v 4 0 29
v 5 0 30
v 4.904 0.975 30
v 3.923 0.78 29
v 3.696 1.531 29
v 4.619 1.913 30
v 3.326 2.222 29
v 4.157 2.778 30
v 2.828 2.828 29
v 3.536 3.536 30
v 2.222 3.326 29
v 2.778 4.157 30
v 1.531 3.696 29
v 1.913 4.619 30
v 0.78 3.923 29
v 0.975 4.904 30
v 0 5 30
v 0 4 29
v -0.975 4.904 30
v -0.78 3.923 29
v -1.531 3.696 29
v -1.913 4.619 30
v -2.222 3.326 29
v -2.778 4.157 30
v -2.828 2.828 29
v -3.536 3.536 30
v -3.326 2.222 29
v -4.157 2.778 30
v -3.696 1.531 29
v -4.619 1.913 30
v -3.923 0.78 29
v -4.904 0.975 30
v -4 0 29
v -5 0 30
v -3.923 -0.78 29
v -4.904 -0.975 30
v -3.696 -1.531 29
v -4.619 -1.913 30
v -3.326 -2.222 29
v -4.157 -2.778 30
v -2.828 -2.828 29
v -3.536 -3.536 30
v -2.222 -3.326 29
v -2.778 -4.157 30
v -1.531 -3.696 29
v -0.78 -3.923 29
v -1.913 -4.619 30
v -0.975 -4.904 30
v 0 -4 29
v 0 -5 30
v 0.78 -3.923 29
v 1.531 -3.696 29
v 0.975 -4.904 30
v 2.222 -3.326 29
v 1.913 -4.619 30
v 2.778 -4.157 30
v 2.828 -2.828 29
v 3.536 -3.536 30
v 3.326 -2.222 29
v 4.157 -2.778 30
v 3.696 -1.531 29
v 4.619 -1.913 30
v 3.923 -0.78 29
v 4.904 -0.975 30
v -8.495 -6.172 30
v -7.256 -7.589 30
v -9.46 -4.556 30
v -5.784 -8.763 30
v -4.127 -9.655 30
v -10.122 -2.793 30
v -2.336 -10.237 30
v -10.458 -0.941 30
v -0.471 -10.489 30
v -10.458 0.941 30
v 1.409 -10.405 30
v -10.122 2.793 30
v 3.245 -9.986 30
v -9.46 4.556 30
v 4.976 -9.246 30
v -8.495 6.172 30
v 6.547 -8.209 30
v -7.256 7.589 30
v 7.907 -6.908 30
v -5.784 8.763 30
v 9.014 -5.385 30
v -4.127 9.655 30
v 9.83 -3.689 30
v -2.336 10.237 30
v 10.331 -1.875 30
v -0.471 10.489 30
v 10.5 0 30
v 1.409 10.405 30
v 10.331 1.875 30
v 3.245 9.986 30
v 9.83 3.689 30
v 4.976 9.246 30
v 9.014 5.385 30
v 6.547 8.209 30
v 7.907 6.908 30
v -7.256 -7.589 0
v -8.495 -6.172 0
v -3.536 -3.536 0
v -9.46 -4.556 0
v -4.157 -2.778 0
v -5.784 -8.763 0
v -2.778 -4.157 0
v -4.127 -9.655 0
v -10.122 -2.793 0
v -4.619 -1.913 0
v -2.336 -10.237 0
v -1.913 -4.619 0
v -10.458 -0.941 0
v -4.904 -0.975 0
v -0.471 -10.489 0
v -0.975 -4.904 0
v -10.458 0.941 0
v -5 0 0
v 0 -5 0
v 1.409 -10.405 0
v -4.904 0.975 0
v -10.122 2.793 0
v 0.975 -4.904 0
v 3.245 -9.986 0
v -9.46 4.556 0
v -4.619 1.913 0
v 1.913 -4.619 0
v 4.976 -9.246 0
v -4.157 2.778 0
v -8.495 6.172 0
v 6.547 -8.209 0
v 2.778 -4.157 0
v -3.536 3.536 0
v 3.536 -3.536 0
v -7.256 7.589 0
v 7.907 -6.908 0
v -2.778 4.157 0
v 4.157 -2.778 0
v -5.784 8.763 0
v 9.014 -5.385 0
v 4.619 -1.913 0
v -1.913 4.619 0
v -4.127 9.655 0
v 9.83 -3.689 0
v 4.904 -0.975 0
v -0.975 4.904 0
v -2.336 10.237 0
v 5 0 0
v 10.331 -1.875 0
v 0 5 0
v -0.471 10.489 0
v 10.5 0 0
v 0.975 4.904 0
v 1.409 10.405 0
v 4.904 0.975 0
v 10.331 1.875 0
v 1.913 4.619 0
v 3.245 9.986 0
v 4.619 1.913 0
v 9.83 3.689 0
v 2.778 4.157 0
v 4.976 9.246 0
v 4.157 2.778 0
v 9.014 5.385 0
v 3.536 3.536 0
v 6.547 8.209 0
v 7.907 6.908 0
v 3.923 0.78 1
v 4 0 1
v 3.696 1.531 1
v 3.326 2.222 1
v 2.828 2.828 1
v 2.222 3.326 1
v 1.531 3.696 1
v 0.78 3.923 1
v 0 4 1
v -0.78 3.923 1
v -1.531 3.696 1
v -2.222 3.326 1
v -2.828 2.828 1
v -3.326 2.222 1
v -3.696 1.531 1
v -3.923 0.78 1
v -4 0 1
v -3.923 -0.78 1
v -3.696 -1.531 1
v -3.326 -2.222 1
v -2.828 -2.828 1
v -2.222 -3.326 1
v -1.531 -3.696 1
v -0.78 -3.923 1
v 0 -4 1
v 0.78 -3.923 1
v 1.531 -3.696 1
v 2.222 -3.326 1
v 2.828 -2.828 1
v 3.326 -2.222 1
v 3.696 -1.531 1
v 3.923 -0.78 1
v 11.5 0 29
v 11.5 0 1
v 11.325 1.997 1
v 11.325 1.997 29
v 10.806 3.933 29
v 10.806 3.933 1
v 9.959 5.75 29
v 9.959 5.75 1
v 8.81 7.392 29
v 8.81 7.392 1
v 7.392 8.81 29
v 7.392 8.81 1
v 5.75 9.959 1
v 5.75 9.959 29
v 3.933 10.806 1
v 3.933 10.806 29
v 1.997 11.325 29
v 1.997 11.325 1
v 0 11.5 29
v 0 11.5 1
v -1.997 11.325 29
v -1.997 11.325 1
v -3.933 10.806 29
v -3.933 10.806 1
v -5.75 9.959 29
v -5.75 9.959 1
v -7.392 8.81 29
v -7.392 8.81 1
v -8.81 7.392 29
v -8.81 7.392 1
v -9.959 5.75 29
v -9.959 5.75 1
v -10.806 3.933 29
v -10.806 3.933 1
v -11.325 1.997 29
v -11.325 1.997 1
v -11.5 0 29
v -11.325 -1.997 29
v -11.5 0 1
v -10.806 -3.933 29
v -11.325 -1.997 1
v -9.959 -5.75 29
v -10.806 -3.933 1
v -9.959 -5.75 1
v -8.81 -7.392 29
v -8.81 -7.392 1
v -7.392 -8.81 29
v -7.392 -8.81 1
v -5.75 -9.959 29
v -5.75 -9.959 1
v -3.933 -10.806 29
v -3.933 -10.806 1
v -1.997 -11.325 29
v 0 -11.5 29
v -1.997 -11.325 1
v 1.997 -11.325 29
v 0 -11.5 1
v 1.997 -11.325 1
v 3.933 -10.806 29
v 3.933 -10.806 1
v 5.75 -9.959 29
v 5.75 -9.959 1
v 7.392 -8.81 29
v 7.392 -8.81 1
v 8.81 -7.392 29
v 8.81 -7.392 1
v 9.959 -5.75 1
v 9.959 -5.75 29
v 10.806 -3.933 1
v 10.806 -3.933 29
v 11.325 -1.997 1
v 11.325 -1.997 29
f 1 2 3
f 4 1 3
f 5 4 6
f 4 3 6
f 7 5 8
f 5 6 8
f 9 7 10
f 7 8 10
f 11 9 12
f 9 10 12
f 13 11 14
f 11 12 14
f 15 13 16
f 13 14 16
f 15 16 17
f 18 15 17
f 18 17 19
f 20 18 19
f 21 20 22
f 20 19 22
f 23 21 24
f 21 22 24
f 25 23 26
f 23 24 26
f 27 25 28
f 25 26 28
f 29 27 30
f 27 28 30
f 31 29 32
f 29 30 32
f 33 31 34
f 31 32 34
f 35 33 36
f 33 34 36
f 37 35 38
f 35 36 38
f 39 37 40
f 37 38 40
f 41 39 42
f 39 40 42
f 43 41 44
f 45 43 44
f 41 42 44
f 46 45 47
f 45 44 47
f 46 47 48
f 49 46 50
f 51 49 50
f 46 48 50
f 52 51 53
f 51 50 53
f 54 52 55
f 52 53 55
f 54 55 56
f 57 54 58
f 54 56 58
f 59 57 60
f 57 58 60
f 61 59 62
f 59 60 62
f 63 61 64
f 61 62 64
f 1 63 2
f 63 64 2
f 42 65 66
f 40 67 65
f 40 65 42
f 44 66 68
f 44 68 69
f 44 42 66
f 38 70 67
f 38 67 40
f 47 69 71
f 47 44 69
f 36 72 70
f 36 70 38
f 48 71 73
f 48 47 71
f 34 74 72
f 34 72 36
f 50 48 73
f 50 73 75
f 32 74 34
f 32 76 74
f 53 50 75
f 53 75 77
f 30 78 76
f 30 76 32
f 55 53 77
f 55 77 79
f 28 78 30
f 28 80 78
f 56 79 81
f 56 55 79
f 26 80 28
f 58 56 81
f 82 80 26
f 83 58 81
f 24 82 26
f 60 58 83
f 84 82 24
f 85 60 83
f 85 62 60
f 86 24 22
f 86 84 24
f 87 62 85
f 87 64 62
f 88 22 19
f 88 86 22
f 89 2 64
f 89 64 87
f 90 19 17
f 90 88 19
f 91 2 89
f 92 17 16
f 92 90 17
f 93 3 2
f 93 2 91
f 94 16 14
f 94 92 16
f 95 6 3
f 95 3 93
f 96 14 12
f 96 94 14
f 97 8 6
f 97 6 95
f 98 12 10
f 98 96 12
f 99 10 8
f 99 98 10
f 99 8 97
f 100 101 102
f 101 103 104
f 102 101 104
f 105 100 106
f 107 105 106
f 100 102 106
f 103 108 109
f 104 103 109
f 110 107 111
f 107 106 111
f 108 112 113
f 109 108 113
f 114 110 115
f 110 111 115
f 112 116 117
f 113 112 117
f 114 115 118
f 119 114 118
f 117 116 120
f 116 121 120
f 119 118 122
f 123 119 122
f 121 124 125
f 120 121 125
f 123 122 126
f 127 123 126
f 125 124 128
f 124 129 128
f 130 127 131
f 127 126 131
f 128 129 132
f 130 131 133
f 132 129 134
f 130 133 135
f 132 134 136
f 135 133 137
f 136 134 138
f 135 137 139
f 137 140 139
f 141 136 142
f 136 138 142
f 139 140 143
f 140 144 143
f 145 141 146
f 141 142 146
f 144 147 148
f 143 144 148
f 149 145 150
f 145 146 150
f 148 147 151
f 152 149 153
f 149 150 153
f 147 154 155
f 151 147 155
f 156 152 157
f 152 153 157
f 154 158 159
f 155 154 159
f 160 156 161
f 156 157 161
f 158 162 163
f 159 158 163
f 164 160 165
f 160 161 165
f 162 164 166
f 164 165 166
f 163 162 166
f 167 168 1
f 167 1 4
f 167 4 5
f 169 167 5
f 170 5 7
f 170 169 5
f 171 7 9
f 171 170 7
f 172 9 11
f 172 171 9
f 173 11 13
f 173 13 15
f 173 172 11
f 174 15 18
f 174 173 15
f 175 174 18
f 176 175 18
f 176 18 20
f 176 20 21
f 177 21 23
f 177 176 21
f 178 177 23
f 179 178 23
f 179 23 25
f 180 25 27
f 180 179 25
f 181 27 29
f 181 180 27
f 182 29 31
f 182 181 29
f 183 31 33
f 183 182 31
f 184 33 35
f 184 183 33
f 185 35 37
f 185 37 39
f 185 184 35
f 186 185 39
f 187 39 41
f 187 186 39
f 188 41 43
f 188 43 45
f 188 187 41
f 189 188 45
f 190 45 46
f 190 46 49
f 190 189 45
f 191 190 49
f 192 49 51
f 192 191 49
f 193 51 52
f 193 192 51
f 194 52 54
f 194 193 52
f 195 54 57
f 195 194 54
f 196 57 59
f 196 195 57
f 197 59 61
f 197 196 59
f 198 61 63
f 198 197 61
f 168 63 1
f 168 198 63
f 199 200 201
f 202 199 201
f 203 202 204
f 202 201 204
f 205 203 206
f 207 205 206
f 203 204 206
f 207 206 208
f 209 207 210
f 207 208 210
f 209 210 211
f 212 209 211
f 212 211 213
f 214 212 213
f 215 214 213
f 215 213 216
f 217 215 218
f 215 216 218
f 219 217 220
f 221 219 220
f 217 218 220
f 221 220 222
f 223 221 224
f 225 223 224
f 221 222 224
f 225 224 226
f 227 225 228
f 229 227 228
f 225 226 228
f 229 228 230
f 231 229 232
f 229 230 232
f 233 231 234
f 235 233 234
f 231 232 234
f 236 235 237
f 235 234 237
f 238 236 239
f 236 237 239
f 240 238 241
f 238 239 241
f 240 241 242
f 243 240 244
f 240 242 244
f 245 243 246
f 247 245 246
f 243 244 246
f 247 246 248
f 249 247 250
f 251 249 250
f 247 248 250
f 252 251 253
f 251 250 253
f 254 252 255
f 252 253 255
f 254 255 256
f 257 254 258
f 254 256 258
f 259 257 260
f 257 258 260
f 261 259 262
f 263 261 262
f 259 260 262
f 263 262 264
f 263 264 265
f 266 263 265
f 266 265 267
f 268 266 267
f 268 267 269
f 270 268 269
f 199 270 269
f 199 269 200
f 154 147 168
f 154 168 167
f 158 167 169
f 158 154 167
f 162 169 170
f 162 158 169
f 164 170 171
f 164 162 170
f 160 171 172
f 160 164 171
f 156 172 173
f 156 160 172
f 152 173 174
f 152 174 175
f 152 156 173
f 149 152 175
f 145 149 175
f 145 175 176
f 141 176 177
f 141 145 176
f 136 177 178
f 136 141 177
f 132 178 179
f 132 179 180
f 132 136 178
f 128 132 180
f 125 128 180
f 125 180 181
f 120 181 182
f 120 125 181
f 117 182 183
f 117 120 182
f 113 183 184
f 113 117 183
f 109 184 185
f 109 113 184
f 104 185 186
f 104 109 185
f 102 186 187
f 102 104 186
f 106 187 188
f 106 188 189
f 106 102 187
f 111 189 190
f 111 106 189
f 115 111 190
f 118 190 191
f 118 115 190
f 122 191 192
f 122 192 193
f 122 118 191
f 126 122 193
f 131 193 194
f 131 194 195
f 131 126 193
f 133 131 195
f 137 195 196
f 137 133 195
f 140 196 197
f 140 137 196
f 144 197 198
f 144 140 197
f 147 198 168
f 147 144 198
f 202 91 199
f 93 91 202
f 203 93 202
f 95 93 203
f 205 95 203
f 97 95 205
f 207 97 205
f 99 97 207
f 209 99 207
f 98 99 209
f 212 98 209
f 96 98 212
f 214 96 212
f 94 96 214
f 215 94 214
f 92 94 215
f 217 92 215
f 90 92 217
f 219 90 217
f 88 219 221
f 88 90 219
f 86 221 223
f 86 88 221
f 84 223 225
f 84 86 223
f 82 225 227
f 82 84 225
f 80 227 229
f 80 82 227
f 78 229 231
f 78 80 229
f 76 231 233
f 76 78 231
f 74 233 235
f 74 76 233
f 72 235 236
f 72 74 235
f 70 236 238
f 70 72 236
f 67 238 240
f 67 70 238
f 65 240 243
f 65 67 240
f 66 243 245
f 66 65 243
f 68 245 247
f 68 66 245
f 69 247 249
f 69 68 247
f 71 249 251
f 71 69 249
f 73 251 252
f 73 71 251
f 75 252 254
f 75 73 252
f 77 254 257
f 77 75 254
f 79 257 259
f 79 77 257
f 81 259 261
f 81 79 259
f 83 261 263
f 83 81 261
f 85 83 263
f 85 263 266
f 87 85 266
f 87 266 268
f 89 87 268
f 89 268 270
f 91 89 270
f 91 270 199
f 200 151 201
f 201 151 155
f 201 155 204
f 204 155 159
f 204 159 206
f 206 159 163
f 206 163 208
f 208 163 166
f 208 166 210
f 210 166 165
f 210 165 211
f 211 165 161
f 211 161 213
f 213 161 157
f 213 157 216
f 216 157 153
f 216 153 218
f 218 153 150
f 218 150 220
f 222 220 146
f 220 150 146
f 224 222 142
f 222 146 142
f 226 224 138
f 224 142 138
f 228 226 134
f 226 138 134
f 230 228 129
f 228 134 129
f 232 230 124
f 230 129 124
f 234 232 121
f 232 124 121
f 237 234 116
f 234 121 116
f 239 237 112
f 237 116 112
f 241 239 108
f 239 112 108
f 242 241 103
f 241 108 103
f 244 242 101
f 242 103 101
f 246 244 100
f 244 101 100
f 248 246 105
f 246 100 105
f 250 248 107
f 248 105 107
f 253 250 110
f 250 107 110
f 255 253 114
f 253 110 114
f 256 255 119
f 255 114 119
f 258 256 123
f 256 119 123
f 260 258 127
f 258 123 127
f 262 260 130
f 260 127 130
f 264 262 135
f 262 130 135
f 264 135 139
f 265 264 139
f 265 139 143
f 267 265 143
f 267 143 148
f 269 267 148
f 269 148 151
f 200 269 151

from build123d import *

# Parameters (mm, degrees)
F0_R     = 11.5
F0_R_2   = 4
F1_DEPTH = 30
F2_SIZE  = 1


with BuildPart() as f1:
    # F0 (on Top) → F1 (new body)
    with BuildSketch(Plane.XY):
        Circle(F0_R)
        Circle(F0_R_2, mode=Mode.SUBTRACT)
    extrude(amount=F1_DEPTH)

    # F2
    f2_edges = [f1.edges().sort_by_distance(p)[0] for p in [
        (-4, 0, 30),
        (-11.5, 0, 30),
        (-4, 0, 0),
        (11.5, 0, 15),
        (-11.5, 0, 0),
    ]]
    chamfer(f2_edges, length=F2_SIZE)


solid = f1.part
